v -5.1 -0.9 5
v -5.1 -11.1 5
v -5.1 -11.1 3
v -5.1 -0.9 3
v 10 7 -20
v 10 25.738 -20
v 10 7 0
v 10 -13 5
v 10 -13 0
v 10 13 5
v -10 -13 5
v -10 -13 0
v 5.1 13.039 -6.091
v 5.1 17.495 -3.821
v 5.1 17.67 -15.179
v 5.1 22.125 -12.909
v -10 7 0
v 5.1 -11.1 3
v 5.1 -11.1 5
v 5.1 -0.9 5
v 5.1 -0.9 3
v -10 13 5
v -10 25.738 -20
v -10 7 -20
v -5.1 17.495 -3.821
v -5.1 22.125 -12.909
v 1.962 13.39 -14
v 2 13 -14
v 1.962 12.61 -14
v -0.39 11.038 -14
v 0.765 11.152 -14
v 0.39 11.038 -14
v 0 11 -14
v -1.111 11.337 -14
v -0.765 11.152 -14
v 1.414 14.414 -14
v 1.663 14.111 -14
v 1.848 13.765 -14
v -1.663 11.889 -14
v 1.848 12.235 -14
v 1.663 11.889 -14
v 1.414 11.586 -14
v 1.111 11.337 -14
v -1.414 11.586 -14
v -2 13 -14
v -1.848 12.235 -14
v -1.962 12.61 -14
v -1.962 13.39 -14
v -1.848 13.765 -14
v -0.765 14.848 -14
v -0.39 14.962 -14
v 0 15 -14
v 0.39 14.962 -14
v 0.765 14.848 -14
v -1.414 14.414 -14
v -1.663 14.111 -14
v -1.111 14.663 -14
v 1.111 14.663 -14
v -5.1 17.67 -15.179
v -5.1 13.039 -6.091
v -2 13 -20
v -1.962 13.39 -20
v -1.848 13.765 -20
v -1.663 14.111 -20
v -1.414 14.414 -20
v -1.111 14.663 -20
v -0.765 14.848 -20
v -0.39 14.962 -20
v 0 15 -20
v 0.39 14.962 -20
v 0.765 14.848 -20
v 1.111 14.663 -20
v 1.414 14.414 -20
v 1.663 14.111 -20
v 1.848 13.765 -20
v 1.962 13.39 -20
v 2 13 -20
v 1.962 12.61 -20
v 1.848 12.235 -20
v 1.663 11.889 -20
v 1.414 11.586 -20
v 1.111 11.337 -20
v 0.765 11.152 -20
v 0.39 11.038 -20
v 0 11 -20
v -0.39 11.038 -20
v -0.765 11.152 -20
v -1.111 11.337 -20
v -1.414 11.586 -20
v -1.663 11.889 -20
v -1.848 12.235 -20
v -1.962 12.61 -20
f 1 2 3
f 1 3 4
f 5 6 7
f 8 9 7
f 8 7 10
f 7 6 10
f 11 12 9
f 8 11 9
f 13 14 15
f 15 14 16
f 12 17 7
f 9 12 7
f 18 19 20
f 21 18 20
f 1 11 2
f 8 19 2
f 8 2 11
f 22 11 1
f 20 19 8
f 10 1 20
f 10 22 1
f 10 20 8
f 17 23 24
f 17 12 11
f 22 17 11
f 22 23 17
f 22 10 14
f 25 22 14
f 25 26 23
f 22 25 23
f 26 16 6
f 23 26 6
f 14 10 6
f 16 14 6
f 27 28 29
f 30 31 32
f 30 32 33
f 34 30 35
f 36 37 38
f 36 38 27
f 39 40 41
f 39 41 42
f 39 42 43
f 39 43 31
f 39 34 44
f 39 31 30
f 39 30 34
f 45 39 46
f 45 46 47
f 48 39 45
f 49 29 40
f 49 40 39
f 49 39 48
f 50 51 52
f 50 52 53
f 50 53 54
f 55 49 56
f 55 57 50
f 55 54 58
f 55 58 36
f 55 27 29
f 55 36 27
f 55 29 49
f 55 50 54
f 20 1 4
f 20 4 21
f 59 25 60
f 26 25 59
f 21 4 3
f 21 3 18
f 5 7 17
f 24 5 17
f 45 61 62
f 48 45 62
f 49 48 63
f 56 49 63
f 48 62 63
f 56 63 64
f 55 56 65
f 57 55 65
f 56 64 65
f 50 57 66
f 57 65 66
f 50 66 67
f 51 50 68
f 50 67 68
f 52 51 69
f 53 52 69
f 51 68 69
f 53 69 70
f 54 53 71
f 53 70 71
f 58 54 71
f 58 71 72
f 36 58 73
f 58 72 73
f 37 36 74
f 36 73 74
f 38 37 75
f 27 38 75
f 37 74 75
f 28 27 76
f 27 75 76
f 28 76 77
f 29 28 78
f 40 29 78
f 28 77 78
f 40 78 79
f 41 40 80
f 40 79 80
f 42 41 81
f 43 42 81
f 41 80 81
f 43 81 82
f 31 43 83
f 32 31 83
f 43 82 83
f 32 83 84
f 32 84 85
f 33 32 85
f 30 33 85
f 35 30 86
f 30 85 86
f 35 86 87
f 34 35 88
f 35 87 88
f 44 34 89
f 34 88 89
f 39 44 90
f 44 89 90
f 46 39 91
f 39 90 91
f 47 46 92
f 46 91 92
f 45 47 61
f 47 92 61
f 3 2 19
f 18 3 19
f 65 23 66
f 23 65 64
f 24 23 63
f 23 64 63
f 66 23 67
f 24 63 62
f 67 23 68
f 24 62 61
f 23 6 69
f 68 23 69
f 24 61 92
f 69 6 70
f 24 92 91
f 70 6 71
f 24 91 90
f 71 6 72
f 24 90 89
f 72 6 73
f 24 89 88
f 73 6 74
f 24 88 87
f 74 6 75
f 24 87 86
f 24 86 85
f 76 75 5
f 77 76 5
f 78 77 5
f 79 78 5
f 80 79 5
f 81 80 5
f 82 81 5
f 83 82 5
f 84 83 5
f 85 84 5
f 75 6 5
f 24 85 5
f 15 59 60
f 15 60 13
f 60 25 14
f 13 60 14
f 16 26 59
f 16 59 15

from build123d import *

# Parameters (mm, degrees)
SZKIC1_W                    = 20
SZKIC1_H                    = 26
DODANIE_WYCI_GNI_CIE1_DEPTH = 5
SZKIC2_W                    = 20
SZKIC2_H                    = 6
DODANIE_WYCI_GNI_CIE2_DEPTH = 20
SZKIC3_W                    = 10.2
SZKIC3_H                    = 10.2
WYTNIJ_WYCI_GNI_CIE1_DEPTH  = 2
DODANIE_WYCI_GNI_CIE3_DEPTH = 20
SZKIC5_W                    = 10.2
SZKIC5_H                    = 10.2
WYTNIJ_WYCI_GNI_CIE2_DEPTH  = 5
SZKIC6_R                    = 2
WYTNIJ_WYCI_GNI_CIE3_DEPTH  = 6


with BuildPart() as part:
    # Szkic1 → Dodanie-wyciągnięcie1 (new body)
    with BuildSketch(Plane.XY):
        Rectangle(SZKIC1_W, SZKIC1_H)
    extrude(amount=DODANIE_WYCI_GNI_CIE1_DEPTH)

    # Szkic2 → Dodanie-wyciągnięcie2 (add)
    with BuildSketch(Plane(origin=(0, 0, 0), x_dir=(-1, 0, 0), z_dir=(0, 0, -1))):
        with Locations((0, 10)):
            Rectangle(SZKIC2_W, SZKIC2_H)
    extrude(amount=DODANIE_WYCI_GNI_CIE2_DEPTH)

    # Szkic3 → Wytnij-wyciągnięcie1 (cut)
    with BuildSketch(Plane.XY.offset(5)):
        with Locations((0, -6)):
            Rectangle(SZKIC3_W, SZKIC3_H)
    extrude(amount=-WYTNIJ_WYCI_GNI_CIE1_DEPTH, mode=Mode.SUBTRACT)

    # Szkic4 → Dodanie-wyciągnięcie3 (add)
    with BuildSketch(Plane(origin=(10, 0, 0), x_dir=(0, 0, -1), z_dir=(1, 0, 0))):
        Polygon((-5, 13), (20, 25.738136237), (20, 13), align=None)
    extrude(amount=-DODANIE_WYCI_GNI_CIE3_DEPTH)

    # Szkic5 → Wytnij-wyciągnięcie2 (cut)
    with BuildSketch(Plane(origin=(0, 12.343146626, 6.289147333), x_dir=(1, 0, 0), z_dir=(0, 0.8910065241883706, 0.4539904997395416))):
        with Locations((0, 16.446843876)):
            Rectangle(SZKIC5_W, SZKIC5_H)
    extrude(amount=-WYTNIJ_WYCI_GNI_CIE2_DEPTH, mode=Mode.SUBTRACT)

    # Szkic6 → Wytnij-wyciągnięcie3 (cut)
    with BuildSketch(Plane(origin=(0, 0, -20), x_dir=(-1, 0, 0), z_dir=(0, 0, -1))):
        with Locations((0, 13)):
            Circle(SZKIC6_R)
    extrude(amount=-WYTNIJ_WYCI_GNI_CIE3_DEPTH, mode=Mode.SUBTRACT)


solid = part.part
